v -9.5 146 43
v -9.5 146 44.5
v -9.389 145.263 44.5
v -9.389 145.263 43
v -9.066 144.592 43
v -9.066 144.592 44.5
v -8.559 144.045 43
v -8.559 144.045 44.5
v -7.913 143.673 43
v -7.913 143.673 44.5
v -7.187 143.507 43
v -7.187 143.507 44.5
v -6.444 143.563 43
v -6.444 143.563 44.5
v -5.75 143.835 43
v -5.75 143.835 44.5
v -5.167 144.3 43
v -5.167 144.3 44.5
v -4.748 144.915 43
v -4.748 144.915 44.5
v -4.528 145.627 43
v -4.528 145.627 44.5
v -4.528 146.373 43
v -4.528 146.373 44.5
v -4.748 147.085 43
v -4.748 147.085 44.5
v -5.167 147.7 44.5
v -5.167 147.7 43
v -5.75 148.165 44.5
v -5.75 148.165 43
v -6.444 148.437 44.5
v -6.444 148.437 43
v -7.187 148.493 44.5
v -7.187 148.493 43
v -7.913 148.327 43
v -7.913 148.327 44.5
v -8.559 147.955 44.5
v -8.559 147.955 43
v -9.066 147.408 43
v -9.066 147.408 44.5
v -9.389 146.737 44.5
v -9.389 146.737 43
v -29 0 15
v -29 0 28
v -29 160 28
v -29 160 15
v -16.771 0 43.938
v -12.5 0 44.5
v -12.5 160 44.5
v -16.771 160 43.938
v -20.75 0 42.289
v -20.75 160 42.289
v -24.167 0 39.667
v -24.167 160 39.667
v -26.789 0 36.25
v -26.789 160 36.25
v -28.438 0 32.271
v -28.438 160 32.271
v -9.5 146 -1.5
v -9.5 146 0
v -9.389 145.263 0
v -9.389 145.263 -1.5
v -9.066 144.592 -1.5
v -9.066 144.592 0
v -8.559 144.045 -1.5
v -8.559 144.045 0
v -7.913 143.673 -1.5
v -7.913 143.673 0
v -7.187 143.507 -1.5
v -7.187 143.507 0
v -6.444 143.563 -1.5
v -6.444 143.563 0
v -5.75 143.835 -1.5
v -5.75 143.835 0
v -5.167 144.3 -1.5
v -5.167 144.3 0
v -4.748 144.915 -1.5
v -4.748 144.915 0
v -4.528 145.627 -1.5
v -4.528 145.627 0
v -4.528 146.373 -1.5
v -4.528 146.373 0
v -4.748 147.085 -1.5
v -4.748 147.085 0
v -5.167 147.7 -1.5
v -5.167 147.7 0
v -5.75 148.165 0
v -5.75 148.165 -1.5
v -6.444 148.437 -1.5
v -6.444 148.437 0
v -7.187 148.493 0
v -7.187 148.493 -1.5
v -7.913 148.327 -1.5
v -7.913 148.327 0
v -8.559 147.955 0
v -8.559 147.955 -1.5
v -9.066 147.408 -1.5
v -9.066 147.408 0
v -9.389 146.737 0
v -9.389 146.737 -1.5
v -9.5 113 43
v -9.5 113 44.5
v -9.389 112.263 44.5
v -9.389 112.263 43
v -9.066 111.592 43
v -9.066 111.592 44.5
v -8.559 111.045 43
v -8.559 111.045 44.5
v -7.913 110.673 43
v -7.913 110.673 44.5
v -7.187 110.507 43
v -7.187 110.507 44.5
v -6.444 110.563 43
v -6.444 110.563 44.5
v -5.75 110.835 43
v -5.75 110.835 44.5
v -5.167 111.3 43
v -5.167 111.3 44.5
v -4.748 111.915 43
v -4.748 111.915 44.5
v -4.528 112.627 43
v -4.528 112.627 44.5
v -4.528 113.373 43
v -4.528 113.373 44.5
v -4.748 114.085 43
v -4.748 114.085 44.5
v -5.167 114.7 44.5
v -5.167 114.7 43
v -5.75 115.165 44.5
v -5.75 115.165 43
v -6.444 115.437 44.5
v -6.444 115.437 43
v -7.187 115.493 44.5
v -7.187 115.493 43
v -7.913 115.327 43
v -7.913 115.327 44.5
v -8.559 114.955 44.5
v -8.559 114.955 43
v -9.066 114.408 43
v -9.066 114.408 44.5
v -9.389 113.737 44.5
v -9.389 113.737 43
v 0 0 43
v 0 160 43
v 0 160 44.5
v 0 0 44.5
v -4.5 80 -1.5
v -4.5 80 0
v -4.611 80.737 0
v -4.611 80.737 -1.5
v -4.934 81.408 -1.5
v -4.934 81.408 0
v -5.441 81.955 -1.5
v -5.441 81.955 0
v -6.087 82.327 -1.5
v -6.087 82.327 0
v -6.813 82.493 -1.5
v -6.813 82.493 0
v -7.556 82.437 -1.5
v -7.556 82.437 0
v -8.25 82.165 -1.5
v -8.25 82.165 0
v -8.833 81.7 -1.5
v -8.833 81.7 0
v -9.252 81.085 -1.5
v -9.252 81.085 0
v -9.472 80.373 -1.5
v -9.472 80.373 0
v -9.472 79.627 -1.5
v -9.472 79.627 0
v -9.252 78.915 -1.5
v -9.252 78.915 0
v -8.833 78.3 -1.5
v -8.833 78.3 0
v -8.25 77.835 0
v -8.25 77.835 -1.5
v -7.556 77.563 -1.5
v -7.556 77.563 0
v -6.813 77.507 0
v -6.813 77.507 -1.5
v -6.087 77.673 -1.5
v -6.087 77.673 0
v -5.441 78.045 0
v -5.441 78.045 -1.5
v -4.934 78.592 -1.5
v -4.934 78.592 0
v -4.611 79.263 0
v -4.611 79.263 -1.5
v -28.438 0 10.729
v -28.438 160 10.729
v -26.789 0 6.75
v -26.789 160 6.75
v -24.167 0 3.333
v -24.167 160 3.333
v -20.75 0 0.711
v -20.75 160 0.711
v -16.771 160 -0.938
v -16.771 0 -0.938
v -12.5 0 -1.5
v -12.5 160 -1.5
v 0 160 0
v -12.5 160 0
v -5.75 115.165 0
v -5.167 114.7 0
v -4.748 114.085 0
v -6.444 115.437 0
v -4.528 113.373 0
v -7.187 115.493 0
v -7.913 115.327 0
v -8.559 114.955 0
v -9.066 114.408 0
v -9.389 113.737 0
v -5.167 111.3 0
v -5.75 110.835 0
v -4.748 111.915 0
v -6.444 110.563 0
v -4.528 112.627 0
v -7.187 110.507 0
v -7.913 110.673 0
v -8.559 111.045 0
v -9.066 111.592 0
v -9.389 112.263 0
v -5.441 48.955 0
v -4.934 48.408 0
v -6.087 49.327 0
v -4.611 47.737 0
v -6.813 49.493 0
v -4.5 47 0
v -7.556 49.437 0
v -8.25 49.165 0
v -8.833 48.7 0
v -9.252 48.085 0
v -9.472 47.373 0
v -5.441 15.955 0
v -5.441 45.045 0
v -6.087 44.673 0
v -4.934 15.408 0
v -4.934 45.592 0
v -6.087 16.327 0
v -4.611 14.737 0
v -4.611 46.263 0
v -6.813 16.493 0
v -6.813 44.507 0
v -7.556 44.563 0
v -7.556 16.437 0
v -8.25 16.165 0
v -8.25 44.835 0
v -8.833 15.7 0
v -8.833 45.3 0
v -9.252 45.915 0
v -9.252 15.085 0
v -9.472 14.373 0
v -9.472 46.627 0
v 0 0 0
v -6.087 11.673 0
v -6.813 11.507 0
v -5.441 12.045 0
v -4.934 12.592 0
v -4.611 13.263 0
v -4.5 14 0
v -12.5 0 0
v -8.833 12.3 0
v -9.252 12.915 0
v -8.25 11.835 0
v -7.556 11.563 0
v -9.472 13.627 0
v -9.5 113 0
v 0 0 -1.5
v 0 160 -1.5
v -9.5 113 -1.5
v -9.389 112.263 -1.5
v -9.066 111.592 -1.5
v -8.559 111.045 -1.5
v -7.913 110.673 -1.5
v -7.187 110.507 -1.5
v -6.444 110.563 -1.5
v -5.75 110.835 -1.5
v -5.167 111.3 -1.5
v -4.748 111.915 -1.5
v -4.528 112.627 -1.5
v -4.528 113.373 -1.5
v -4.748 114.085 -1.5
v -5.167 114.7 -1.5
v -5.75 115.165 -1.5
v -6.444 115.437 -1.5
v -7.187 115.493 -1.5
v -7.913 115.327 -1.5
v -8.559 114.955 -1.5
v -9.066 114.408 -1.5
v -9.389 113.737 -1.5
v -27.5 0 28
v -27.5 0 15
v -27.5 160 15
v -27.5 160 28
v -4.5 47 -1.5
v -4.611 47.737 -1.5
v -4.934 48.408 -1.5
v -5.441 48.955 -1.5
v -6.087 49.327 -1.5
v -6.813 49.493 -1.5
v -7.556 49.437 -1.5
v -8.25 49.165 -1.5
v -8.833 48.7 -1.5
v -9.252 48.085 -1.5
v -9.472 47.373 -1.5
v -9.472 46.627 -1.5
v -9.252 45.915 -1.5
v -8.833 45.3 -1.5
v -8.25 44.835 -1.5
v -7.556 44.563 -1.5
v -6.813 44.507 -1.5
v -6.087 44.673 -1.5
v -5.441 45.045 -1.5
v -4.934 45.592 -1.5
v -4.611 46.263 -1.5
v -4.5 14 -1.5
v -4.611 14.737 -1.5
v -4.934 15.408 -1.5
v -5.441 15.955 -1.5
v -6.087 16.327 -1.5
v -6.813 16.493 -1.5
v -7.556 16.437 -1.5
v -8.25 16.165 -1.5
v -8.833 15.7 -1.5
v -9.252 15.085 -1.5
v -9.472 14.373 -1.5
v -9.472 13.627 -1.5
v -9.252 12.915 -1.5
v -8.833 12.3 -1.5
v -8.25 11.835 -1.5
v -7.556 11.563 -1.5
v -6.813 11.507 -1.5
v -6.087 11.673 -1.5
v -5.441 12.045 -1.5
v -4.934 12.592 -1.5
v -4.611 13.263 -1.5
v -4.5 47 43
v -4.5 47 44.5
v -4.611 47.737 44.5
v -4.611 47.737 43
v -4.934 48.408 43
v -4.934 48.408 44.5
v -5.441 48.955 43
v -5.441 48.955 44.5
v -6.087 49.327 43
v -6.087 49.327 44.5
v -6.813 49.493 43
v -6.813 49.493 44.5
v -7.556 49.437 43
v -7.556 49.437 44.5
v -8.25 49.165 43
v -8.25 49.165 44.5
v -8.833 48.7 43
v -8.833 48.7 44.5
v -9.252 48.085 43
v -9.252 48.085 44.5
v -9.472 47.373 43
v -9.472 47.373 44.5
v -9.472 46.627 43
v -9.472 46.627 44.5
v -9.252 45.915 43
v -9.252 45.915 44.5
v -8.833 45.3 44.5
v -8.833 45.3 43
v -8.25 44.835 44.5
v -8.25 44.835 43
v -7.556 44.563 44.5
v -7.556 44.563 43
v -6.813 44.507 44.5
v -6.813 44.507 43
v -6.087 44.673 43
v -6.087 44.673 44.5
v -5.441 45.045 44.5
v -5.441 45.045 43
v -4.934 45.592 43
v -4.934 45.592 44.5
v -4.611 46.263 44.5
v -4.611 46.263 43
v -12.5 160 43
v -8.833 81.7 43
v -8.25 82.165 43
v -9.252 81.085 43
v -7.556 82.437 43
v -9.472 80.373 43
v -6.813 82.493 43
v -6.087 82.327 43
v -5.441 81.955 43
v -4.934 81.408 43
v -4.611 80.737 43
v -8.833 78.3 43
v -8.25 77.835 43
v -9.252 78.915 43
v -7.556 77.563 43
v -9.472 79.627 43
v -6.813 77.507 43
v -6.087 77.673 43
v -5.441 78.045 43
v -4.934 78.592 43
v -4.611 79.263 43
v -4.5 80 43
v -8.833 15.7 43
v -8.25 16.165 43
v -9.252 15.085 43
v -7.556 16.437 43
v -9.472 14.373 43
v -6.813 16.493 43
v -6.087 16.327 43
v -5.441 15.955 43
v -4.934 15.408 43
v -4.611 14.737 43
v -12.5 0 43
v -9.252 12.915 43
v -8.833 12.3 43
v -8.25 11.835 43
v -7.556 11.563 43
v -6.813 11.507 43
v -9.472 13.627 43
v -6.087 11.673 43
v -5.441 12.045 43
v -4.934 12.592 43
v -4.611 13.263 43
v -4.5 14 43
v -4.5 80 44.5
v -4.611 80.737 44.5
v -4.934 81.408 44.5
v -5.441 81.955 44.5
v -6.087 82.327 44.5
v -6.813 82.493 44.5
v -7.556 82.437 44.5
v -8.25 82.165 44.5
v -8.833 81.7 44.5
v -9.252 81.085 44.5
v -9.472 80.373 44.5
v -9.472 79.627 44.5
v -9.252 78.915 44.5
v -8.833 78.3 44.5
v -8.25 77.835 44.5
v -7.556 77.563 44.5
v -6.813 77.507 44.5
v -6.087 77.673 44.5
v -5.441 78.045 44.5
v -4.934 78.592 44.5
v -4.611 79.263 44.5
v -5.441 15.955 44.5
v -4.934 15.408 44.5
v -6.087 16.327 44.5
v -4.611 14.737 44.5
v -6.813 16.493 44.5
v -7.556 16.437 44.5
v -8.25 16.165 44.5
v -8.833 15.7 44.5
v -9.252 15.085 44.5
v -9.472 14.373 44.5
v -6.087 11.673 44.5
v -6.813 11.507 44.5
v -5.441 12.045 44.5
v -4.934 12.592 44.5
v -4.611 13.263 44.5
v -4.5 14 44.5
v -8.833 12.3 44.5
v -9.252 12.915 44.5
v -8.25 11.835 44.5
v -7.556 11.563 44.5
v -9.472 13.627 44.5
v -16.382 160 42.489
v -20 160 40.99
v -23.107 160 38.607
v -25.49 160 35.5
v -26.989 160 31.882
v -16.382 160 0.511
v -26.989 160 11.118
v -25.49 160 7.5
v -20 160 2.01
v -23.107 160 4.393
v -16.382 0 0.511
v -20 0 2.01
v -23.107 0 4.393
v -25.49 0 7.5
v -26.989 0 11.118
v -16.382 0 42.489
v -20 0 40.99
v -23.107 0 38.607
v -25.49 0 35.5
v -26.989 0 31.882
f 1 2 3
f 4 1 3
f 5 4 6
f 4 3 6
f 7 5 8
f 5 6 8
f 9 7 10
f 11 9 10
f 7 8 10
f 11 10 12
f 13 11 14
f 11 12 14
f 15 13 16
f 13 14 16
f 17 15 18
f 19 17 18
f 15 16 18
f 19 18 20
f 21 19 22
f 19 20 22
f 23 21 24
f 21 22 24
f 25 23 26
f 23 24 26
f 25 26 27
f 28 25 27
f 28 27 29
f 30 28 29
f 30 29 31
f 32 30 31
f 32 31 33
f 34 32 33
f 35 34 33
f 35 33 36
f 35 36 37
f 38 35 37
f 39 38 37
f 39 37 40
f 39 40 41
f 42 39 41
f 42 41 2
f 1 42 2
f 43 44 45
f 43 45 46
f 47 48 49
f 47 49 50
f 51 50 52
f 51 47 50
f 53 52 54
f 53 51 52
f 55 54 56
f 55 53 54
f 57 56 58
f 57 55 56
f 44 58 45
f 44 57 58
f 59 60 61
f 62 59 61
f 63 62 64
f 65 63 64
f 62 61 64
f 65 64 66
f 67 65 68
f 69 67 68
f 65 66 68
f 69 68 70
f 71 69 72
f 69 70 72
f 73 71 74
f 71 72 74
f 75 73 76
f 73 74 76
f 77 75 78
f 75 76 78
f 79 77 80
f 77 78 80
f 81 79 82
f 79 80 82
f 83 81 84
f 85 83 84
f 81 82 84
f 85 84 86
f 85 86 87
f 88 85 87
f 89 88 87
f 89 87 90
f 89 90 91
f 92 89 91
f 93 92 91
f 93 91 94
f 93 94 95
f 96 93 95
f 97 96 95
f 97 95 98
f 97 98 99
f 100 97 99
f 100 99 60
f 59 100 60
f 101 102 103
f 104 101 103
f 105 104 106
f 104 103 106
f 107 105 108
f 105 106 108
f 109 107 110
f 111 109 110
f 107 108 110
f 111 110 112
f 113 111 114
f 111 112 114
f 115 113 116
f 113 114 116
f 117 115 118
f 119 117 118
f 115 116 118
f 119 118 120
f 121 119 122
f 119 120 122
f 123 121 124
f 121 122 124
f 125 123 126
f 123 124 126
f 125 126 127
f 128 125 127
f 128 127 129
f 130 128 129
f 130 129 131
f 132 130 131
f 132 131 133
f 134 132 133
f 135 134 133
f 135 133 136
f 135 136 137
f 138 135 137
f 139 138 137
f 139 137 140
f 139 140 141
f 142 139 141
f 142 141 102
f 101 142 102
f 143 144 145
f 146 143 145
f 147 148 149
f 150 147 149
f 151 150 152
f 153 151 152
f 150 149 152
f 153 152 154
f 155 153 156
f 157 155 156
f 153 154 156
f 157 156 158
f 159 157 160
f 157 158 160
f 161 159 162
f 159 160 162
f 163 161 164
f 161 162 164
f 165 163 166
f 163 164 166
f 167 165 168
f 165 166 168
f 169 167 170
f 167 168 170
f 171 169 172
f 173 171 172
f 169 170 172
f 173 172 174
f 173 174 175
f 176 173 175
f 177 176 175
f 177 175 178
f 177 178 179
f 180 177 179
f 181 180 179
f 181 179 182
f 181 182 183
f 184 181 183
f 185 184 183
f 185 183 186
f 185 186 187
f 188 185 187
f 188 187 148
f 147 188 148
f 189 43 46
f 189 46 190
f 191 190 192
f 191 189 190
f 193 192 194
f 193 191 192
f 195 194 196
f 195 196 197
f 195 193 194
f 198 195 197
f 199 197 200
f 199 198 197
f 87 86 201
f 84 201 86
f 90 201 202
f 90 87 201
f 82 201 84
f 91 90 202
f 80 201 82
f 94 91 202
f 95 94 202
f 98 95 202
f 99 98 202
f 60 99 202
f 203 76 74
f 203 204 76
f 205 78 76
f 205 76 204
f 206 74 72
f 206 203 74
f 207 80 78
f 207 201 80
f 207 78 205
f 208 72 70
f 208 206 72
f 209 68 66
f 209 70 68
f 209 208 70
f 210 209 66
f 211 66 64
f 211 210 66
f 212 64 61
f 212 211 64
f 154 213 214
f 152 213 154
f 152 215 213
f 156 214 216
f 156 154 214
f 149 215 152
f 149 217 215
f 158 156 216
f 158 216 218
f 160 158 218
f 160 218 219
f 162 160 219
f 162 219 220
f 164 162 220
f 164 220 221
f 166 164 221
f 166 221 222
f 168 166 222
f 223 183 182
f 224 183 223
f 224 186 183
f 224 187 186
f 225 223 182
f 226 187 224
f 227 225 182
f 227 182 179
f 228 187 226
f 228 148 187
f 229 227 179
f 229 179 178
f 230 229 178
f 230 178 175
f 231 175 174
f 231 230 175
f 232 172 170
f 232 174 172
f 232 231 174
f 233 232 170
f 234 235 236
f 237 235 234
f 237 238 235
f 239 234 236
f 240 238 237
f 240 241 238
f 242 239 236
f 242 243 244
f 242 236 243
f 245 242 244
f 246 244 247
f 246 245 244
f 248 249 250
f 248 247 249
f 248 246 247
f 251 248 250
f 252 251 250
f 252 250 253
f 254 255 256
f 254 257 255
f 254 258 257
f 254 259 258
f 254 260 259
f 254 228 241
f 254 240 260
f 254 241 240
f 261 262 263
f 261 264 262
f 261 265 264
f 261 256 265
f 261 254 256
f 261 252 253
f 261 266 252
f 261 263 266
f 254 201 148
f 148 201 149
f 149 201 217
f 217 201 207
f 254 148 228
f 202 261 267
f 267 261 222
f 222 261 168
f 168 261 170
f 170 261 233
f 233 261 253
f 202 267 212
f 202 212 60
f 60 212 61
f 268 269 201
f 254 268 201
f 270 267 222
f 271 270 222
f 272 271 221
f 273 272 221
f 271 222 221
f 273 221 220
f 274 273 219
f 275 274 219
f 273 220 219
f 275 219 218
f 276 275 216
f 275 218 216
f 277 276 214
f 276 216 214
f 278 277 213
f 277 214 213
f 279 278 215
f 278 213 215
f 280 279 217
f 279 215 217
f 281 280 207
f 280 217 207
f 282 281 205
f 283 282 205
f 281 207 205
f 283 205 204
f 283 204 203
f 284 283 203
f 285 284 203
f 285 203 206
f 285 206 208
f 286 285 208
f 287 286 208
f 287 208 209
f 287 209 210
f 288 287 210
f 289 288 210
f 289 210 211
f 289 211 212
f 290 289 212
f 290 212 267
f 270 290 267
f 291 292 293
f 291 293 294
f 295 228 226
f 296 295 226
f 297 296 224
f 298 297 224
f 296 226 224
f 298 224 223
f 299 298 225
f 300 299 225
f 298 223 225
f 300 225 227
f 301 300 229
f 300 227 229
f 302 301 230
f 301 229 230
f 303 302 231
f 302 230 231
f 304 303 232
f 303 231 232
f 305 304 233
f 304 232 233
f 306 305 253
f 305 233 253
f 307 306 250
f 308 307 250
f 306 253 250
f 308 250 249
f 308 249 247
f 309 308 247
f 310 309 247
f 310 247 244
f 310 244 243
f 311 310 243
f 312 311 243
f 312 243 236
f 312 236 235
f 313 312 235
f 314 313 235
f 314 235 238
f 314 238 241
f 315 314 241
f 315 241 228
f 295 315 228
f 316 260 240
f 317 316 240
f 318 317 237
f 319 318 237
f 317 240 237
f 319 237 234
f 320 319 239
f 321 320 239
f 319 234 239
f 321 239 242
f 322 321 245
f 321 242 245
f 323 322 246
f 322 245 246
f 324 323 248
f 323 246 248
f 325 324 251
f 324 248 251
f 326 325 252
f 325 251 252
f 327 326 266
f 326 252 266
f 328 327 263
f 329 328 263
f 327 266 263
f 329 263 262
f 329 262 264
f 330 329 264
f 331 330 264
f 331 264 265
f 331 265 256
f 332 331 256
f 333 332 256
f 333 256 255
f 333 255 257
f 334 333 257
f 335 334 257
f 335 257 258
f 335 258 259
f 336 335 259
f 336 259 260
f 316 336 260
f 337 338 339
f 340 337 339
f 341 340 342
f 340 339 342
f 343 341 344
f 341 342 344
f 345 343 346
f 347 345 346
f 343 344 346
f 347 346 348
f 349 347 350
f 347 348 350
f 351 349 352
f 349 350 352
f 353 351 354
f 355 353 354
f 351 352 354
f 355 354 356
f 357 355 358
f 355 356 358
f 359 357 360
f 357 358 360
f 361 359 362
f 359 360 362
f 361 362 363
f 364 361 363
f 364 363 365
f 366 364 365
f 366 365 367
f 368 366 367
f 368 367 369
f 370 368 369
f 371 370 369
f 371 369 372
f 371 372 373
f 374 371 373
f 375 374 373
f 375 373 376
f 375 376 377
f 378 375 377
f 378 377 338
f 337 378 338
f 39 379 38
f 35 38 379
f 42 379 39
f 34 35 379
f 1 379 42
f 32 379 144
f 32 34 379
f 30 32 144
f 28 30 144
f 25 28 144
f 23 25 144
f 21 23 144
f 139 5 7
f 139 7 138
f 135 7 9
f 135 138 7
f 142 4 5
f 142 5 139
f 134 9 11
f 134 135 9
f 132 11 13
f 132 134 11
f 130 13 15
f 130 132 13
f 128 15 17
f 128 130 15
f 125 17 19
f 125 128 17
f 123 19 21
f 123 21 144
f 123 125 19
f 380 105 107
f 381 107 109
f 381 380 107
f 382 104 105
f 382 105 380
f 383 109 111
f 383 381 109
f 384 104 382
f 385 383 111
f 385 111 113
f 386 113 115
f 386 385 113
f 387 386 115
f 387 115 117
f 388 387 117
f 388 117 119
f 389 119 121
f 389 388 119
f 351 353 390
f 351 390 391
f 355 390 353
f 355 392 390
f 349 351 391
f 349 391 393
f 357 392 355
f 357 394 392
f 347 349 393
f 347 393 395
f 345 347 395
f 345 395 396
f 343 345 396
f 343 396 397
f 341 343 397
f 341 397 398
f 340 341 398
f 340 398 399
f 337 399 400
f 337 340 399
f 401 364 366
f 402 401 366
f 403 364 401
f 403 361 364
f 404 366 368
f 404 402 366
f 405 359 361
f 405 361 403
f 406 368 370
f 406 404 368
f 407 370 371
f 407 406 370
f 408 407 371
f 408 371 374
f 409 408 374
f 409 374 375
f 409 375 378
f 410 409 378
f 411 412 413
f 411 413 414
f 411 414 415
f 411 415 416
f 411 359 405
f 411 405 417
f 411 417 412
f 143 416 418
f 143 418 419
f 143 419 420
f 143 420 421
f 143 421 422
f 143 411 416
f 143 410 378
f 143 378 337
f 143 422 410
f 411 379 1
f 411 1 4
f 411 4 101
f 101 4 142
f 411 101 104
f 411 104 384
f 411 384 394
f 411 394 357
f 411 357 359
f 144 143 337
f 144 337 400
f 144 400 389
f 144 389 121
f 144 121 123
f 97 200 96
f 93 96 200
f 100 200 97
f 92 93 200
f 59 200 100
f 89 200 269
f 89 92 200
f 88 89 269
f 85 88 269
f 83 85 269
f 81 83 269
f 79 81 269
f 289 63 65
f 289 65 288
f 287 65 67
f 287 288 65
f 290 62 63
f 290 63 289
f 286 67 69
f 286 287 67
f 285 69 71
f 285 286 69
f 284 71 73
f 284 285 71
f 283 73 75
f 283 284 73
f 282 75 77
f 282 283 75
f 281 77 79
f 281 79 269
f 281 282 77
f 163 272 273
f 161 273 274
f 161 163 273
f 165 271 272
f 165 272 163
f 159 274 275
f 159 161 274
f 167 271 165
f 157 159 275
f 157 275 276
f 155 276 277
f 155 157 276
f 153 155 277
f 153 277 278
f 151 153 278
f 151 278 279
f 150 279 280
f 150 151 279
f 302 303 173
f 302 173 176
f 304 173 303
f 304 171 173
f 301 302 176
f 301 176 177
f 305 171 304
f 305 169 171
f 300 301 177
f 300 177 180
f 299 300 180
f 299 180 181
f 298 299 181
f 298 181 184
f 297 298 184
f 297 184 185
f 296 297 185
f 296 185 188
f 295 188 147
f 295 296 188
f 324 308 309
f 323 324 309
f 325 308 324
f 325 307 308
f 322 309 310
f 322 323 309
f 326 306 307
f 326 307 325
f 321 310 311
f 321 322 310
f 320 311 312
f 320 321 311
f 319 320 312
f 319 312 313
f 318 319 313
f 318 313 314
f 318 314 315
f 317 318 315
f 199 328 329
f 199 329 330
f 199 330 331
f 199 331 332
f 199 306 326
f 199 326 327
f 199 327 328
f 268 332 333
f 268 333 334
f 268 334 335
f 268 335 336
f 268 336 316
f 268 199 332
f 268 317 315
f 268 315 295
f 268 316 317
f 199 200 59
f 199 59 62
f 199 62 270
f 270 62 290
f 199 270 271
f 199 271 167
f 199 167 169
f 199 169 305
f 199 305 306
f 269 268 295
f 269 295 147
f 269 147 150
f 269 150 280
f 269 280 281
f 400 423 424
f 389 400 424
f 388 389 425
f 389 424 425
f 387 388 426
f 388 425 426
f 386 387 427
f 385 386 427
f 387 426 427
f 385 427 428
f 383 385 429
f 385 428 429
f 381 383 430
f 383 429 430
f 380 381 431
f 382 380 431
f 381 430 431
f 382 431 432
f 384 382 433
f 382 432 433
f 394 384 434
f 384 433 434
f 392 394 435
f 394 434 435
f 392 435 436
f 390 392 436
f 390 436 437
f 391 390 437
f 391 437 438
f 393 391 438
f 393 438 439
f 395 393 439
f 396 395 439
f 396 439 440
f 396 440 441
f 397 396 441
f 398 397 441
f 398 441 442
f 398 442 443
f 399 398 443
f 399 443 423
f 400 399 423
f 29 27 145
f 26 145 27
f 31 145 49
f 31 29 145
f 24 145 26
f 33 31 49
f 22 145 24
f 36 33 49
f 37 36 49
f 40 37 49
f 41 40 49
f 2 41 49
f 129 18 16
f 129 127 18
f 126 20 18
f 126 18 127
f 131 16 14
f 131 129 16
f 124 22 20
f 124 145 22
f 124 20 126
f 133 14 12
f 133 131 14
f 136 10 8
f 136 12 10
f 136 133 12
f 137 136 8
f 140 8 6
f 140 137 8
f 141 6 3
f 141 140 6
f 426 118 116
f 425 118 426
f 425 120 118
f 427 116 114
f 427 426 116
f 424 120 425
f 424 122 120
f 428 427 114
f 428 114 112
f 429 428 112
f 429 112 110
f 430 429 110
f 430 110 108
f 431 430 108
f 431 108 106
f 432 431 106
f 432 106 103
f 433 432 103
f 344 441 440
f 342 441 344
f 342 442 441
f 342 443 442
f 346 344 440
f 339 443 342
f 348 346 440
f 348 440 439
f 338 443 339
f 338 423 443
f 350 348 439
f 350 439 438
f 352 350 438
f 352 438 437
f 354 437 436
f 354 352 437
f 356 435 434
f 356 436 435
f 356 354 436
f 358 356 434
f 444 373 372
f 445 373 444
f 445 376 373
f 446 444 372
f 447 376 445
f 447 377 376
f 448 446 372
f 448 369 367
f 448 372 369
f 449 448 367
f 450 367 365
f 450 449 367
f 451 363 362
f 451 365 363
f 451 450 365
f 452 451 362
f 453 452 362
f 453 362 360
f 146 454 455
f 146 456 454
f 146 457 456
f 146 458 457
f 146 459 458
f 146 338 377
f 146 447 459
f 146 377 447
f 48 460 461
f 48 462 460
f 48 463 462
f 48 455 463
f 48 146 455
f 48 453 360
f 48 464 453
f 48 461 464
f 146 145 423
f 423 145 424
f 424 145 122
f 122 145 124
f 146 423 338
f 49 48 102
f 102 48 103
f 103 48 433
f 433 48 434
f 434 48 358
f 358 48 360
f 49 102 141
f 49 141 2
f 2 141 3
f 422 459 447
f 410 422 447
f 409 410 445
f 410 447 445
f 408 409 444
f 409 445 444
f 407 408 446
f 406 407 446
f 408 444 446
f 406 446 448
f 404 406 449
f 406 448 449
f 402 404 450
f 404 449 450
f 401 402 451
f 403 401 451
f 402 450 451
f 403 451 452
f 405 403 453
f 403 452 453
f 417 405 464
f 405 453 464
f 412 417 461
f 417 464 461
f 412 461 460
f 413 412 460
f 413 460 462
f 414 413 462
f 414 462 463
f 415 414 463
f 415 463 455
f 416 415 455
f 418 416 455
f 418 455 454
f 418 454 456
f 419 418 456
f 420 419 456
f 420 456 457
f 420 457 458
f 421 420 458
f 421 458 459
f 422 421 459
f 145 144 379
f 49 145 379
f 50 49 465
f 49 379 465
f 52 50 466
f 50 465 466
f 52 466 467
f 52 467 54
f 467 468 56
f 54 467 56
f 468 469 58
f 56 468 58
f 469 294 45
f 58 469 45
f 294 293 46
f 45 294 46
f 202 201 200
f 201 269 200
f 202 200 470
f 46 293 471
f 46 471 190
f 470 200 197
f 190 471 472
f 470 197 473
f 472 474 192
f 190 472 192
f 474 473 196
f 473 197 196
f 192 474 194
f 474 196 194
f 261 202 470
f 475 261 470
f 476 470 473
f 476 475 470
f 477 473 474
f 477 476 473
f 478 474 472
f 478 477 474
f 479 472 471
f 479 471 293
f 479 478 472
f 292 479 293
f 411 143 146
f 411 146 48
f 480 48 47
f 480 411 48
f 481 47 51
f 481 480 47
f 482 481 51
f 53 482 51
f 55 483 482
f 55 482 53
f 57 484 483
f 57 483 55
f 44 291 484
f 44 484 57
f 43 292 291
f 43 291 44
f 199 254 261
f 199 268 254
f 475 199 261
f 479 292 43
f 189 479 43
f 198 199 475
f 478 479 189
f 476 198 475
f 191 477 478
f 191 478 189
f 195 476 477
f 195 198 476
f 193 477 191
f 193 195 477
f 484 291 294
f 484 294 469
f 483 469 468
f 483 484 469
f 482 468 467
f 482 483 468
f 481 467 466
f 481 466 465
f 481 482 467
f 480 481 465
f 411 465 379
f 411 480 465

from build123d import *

# Parameters (mm, degrees)
EXTRUDE_2_DEPTH     = 160
SKETCH_5_R          = 2.5
CUT_EXTRUDE_1_DEPTH = 169.988165266


with BuildPart() as part:
    # Эскиз4 → Бобышка-Вытянуть2 (new body)
    with BuildSketch(Plane(origin=(0, 0, 0), x_dir=(1, 0, 0), z_dir=(0, 1, 0))):
        with BuildLine():
            Line((0, 0), (-12.5, 0))
            ThreePointArc((-12.5, 0), (-23.106601718, -4.393398282), (-27.5, -15))
            Line((-27.5, -15), (-27.5, -28))
            ThreePointArc((-27.5, -28), (-23.106601718, -38.606601718), (-12.5, -43))
            Line((-12.5, -43), (0, -43))
            Line((0, -43), (0, -44.5))
            Line((0, -44.5), (-12.5, -44.5))
            ThreePointArc((-12.5, -44.5), (-24.16726189, -39.66726189), (-29, -28))
            Line((-29, -28), (-29, -15))
            ThreePointArc((-29, -15), (-24.16726189, -3.33273811), (-12.5, 1.5))
            Line((-12.5, 1.5), (0, 1.5))
            Line((0, 1.5), (0, 0))
        make_face()
    extrude(amount=EXTRUDE_2_DEPTH)

    # Эскиз5 → Вырез-Вытянуть1 (cut, through all)
    with BuildSketch(Plane.XY.offset(44.5)):
        with Locations((-7, 80)):
            Circle(SKETCH_5_R)
        with Locations((-7, 47)):
            Circle(SKETCH_5_R)
        with Locations((-7, 14)):
            Circle(SKETCH_5_R)
        with Locations((-7, 146)):
            Circle(SKETCH_5_R)
        with Locations((-7, 113)):
            Circle(SKETCH_5_R)
    extrude(amount=-CUT_EXTRUDE_1_DEPTH, mode=Mode.SUBTRACT)


solid = part.part
